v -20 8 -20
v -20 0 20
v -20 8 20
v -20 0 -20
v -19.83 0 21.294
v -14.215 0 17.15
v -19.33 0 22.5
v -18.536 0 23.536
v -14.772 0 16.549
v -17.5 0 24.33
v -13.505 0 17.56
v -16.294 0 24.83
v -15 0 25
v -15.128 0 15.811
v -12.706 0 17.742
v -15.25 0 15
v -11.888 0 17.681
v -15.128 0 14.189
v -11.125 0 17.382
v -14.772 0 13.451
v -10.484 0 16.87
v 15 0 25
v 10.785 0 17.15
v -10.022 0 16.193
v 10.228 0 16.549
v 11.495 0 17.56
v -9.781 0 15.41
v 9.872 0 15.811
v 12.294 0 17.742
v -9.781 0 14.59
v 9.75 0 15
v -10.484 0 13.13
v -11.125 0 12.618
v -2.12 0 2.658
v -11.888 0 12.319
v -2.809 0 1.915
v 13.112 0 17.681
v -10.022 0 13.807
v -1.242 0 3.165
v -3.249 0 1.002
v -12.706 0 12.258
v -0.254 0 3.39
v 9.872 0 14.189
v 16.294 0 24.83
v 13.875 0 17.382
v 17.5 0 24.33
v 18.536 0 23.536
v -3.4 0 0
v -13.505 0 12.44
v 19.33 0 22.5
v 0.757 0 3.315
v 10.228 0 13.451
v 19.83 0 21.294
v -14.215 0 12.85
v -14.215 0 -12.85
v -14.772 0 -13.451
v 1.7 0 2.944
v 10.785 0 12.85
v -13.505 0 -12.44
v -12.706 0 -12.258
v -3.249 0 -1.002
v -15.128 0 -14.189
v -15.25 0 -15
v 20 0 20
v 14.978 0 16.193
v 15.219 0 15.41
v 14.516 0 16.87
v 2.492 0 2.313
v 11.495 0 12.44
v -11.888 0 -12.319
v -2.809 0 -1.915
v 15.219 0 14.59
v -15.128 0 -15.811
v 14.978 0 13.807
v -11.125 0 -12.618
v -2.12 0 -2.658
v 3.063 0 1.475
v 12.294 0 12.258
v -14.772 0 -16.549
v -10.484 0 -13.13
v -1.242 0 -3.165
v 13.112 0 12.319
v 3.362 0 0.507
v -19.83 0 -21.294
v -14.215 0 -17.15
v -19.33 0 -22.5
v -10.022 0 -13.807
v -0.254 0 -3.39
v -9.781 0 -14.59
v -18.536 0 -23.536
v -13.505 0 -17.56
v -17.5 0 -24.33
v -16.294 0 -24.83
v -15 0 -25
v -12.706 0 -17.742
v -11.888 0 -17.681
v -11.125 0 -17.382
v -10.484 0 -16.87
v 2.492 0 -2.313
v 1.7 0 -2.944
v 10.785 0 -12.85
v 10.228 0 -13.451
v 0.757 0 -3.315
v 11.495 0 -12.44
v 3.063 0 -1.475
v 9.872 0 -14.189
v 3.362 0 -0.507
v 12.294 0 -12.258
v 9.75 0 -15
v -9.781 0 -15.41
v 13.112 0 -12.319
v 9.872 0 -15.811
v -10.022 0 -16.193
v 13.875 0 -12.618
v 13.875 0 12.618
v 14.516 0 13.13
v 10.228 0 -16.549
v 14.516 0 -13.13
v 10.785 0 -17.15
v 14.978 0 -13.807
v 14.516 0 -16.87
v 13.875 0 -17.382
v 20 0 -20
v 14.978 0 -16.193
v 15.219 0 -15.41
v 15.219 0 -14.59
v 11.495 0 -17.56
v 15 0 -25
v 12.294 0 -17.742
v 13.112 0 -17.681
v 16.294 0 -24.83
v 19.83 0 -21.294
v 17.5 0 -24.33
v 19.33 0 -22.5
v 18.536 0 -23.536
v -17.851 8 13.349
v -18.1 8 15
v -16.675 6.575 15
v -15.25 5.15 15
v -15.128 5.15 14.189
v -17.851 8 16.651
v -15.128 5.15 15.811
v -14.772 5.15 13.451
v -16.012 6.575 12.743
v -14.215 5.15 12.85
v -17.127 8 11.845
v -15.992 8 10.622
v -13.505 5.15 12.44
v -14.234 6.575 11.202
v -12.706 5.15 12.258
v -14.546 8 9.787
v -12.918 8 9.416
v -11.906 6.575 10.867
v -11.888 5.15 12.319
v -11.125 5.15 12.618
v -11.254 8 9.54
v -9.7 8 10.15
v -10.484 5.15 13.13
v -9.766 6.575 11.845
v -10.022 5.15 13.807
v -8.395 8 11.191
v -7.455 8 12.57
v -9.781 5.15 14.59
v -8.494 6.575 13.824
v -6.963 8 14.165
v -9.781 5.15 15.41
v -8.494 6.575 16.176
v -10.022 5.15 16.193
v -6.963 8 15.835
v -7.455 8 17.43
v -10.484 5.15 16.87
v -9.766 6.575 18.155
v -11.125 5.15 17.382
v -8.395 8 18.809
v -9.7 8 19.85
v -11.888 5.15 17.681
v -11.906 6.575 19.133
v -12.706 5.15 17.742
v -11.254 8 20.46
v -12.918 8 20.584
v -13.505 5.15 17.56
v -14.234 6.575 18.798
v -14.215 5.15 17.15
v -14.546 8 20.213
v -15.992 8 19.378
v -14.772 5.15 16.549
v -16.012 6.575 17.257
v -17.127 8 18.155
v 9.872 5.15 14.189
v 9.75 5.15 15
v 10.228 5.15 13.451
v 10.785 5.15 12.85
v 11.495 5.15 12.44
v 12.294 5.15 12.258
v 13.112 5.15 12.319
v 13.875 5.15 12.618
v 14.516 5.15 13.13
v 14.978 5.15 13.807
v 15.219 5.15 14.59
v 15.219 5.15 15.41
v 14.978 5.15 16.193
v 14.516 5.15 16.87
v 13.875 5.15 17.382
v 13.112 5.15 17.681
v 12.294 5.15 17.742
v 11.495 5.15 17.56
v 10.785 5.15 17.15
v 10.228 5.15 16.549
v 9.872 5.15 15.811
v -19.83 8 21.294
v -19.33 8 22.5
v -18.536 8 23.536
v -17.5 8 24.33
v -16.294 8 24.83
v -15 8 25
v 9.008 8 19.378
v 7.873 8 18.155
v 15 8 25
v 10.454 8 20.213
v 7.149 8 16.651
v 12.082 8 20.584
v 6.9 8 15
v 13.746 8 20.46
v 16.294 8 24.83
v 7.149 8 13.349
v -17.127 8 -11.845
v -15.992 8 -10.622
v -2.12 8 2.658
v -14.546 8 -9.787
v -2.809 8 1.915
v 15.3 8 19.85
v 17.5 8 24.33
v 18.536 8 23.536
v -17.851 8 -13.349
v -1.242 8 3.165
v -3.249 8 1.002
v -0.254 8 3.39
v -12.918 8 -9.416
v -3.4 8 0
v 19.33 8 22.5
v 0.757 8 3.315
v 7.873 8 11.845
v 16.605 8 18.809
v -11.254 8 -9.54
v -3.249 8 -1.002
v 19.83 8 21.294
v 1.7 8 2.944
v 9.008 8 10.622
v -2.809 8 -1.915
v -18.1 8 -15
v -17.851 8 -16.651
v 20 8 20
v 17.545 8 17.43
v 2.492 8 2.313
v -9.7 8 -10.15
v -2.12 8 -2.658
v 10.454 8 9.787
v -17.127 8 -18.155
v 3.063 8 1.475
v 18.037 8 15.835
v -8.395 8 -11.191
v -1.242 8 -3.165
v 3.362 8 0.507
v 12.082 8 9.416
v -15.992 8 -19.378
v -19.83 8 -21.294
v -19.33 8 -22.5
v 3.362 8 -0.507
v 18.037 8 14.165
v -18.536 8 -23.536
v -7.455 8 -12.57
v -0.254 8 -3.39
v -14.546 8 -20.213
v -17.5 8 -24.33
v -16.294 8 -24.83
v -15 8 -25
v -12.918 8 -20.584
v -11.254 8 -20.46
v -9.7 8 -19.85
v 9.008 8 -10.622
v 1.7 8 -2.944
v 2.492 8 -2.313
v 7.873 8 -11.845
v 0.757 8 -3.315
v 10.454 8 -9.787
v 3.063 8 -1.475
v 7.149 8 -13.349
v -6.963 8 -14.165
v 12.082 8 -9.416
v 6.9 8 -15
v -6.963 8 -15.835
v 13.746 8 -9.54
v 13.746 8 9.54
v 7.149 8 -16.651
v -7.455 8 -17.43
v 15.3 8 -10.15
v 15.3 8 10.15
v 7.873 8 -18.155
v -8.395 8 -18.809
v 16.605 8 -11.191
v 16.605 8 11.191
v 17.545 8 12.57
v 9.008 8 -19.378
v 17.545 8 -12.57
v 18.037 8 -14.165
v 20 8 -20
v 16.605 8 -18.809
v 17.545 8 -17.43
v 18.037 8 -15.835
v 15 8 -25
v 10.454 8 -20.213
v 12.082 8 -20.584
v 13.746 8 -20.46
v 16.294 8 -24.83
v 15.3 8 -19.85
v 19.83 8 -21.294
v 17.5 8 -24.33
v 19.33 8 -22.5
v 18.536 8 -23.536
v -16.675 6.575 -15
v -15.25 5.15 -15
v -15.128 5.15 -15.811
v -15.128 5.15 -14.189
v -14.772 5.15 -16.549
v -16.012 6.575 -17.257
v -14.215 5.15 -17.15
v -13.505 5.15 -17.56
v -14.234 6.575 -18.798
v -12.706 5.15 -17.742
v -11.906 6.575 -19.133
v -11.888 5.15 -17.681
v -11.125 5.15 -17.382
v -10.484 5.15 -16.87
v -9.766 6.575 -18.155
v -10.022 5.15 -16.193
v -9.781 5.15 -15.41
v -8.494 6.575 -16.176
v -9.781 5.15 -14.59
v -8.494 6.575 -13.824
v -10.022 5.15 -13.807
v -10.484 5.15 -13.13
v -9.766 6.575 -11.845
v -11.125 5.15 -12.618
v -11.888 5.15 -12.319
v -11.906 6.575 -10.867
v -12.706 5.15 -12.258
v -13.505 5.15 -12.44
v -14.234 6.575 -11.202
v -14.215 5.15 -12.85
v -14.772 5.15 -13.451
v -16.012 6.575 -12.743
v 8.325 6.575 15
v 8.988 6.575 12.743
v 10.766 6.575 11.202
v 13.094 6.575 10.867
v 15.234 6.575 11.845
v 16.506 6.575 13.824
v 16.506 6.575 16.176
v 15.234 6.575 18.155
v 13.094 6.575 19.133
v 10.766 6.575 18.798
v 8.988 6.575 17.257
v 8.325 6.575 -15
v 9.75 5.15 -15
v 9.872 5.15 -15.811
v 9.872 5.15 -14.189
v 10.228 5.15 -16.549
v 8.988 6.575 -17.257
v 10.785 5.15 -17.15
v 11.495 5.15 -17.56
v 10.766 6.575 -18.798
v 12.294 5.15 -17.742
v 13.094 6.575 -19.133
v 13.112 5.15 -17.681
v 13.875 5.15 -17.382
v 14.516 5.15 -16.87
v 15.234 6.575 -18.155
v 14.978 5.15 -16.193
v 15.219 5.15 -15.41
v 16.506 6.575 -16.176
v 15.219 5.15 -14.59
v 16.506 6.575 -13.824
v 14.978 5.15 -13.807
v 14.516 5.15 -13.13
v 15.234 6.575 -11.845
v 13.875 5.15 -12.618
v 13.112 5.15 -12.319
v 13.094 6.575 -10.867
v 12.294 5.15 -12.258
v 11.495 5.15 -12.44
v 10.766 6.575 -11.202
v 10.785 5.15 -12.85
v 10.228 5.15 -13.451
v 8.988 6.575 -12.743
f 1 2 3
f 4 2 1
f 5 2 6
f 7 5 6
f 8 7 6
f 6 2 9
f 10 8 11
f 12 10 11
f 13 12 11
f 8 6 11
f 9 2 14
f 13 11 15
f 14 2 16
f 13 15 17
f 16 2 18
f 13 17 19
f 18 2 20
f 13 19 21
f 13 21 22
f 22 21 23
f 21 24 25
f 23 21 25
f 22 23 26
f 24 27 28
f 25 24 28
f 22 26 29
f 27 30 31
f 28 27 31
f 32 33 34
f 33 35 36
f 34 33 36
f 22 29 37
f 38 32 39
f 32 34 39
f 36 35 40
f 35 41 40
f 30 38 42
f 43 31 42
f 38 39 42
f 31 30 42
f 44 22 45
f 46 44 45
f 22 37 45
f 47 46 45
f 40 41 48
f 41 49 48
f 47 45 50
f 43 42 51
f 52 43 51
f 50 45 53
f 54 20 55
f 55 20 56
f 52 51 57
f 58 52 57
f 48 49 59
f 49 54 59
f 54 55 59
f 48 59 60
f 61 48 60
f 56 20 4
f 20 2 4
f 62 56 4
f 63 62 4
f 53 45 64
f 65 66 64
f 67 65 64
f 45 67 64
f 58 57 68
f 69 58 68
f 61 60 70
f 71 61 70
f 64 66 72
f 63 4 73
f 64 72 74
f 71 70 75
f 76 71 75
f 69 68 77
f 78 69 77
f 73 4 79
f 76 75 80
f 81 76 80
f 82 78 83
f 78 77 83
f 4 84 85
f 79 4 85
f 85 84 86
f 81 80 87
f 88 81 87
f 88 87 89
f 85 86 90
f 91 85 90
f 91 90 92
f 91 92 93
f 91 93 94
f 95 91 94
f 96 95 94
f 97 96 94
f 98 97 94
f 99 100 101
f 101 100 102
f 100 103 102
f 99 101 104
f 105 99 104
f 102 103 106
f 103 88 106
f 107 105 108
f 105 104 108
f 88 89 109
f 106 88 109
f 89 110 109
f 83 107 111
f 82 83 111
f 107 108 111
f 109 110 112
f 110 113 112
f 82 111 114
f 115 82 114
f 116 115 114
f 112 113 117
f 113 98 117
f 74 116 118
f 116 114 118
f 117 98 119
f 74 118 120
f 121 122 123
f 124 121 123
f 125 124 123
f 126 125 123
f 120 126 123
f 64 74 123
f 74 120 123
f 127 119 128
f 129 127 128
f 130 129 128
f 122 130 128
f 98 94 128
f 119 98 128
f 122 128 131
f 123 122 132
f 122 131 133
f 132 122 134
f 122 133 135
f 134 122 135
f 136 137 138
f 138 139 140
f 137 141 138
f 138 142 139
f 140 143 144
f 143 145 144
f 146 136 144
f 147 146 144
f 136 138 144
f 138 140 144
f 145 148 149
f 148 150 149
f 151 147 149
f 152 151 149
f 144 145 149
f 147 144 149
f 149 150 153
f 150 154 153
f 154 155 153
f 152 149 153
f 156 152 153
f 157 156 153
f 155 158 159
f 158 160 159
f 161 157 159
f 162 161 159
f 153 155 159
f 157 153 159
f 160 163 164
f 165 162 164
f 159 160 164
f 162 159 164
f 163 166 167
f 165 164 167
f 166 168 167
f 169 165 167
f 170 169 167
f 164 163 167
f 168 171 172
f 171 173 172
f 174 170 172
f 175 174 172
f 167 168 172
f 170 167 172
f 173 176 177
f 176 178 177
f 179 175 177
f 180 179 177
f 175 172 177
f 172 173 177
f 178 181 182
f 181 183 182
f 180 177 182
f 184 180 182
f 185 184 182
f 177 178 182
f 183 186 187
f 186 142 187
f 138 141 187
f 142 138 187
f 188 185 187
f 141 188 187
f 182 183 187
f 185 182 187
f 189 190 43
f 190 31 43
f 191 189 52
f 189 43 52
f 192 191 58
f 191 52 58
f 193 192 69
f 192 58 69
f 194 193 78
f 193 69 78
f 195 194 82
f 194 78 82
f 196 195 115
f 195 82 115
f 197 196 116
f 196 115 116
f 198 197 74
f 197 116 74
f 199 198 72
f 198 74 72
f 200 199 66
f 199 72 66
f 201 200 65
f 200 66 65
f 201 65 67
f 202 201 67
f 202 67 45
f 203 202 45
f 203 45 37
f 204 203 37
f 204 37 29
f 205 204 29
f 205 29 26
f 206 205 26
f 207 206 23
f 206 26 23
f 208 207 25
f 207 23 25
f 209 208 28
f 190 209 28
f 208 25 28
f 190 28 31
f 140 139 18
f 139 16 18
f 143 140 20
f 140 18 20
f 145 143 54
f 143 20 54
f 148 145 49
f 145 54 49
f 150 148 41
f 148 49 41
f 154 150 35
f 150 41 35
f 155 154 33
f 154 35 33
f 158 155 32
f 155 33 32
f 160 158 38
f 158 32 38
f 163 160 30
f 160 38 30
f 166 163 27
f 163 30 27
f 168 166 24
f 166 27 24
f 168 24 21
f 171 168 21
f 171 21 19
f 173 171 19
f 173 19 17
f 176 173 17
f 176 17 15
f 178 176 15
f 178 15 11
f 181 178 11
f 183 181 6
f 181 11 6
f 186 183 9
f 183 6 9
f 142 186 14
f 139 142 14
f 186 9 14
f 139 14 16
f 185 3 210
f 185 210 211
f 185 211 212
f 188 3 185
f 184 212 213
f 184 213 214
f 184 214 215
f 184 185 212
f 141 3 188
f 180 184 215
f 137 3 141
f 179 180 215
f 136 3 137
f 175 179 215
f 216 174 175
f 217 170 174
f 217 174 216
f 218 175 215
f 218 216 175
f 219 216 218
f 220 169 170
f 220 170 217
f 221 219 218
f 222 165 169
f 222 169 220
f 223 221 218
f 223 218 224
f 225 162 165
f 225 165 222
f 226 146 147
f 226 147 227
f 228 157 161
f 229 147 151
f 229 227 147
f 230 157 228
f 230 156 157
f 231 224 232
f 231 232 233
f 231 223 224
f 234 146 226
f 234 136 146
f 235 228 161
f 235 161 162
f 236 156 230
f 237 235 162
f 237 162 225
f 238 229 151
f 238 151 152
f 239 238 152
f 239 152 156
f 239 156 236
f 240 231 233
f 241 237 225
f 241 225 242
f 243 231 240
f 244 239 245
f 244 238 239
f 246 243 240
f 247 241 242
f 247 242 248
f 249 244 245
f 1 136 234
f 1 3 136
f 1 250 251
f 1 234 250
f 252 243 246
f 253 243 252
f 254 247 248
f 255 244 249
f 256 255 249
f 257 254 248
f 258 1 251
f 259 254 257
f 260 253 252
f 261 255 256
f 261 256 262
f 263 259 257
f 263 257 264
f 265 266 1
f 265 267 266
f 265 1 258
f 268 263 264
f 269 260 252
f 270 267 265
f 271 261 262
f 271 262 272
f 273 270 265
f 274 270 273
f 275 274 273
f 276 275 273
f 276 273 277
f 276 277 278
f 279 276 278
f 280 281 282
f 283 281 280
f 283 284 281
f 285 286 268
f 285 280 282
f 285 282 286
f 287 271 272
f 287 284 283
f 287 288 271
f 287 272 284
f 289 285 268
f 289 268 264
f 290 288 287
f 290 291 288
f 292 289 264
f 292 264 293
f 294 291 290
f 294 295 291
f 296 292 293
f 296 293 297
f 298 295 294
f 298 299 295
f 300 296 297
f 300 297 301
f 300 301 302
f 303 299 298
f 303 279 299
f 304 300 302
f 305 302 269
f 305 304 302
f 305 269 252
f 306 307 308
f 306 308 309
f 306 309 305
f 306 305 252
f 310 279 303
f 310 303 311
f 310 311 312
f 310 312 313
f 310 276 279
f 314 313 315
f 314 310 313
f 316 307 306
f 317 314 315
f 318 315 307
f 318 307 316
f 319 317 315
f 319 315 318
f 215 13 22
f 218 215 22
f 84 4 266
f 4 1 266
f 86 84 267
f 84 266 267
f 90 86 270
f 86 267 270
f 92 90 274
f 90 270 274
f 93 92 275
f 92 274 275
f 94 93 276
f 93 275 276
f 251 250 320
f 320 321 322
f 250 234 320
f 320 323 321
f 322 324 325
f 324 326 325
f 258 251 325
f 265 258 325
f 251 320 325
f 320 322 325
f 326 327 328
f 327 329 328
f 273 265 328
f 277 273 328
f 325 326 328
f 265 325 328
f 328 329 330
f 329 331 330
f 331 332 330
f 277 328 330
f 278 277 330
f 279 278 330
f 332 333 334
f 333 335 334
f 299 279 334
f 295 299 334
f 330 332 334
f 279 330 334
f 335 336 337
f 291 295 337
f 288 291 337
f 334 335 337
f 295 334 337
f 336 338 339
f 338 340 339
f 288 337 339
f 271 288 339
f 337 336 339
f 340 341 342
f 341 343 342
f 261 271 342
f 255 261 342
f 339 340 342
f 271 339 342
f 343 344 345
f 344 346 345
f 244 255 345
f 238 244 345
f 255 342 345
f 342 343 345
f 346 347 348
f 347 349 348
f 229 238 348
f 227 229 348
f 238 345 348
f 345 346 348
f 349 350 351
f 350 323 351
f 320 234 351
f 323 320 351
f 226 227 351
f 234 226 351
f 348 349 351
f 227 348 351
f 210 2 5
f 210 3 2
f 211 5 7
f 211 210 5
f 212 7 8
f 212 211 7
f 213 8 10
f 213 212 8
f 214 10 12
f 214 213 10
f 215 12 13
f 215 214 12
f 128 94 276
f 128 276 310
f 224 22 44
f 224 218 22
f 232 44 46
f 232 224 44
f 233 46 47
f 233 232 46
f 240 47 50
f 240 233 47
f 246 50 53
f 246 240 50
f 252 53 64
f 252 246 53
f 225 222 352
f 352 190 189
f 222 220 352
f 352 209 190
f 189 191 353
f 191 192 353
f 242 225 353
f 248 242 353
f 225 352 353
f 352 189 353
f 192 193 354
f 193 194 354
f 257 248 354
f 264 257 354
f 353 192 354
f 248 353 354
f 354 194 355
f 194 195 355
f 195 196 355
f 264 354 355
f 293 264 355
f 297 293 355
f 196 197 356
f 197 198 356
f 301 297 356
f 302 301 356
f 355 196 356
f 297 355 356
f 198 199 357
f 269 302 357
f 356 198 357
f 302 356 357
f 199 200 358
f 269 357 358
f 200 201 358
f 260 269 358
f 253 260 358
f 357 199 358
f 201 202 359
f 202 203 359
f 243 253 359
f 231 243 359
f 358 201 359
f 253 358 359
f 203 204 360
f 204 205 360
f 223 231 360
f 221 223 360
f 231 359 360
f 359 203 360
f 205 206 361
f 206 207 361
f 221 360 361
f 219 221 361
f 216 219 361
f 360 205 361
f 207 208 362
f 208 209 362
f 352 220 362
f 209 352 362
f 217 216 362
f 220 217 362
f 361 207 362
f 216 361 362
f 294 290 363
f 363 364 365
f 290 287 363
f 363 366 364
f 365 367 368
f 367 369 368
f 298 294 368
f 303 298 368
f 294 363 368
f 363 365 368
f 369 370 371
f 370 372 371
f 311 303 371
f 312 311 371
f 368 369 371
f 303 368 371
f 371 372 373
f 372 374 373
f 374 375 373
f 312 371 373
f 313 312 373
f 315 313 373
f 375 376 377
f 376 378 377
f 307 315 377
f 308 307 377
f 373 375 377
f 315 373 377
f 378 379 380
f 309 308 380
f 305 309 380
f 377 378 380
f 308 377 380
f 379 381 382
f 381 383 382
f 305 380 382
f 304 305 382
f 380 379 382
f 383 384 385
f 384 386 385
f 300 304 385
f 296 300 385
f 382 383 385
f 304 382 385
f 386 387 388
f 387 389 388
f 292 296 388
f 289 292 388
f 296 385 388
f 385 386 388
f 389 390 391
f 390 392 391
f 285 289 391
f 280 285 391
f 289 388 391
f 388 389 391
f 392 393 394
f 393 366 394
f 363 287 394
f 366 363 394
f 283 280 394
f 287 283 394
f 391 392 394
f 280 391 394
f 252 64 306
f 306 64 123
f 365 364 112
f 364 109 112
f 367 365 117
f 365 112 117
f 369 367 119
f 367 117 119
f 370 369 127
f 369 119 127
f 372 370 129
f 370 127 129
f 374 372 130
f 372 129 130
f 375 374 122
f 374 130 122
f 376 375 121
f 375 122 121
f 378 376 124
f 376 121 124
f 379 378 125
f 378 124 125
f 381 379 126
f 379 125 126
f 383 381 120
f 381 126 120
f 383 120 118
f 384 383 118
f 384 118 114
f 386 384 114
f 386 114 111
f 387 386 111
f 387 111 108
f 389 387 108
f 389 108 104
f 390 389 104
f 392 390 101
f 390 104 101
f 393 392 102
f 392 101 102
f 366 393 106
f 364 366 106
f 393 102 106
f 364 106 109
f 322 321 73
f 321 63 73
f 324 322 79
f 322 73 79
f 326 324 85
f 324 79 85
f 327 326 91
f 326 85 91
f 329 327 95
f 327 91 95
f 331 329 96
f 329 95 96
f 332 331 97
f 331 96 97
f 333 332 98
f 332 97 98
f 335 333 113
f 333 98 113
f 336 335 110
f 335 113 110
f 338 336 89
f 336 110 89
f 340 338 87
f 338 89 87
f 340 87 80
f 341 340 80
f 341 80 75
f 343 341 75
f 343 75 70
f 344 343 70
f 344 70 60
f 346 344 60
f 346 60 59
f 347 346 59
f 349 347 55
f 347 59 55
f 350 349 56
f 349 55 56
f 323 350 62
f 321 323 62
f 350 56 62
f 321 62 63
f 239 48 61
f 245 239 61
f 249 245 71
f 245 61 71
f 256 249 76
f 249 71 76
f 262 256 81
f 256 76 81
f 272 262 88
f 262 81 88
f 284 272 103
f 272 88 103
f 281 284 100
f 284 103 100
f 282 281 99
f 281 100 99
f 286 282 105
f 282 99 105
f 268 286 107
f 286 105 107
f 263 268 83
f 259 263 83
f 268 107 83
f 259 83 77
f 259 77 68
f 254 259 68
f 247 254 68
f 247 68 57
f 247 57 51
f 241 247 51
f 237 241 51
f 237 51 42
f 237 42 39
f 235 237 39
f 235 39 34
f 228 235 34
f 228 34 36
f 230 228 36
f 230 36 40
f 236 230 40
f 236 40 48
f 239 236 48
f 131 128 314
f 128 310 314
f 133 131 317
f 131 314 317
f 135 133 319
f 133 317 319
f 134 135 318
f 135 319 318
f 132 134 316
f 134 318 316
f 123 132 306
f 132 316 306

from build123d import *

# Parameters (mm, degrees)
SKETCH1_W                                            = 40
SKETCH1_H                                            = 50
BOSS_EXTRUDE1_DEPTH                                  = 8
CSK_FOR_M5_HEX_SOCKET_COUNTERSUNK_CAP_SC_D           = 5.5
CSK_FOR_M5_HEX_SOCKET_COUNTERSUNK_CAP_SC_CSINK_D     = 11.2
CSK_FOR_M5_HEX_SOCKET_COUNTERSUNK_CAP_SC_CSINK_ANGLE = 90
M8_TAPPED_HOLE1_D                                    = 6.8
FILLET1_R                                            = 5


with BuildPart() as part:
    # Sketch1 → Boss-Extrude1 (new body)
    with BuildSketch(Plane(origin=(0, 0, 0), x_dir=(1, 0, 0), z_dir=(0, 1, 0))):
        Rectangle(SKETCH1_W, SKETCH1_H)
    extrude(amount=BOSS_EXTRUDE1_DEPTH)

    # CSK for M5 Hex Socket Countersunk Cap Screw1 (through all)
    with Locations(Plane(origin=(0, 8, 0), x_dir=(1, 0, 0), z_dir=(0, 1, 0))):
        with Locations((-12.5, 15), (-12.5, -15), (12.5, -15), (12.5, 15)):
            CounterSinkHole(CSK_FOR_M5_HEX_SOCKET_COUNTERSUNK_CAP_SC_D / 2, CSK_FOR_M5_HEX_SOCKET_COUNTERSUNK_CAP_SC_CSINK_D / 2, counter_sink_angle=CSK_FOR_M5_HEX_SOCKET_COUNTERSUNK_CAP_SC_CSINK_ANGLE)

    # M8 Tapped Hole1 (through all)
    with Locations(Plane(origin=(0, 8, 0), x_dir=(1, 0, 0), z_dir=(0, 1, 0))):
        with Locations((0, 0)):
            Hole(M8_TAPPED_HOLE1_D / 2)

    # Fillet1
    fillet1_edges = [part.edges().sort_by_distance(p)[0] for p in [
        (20, 4, 25),
        (-20, 4, 25),
        (-20, 4, -25),
        (20, 4, -25),
    ]]
    fillet(fillet1_edges, radius=FILLET1_R)


solid = part.part
